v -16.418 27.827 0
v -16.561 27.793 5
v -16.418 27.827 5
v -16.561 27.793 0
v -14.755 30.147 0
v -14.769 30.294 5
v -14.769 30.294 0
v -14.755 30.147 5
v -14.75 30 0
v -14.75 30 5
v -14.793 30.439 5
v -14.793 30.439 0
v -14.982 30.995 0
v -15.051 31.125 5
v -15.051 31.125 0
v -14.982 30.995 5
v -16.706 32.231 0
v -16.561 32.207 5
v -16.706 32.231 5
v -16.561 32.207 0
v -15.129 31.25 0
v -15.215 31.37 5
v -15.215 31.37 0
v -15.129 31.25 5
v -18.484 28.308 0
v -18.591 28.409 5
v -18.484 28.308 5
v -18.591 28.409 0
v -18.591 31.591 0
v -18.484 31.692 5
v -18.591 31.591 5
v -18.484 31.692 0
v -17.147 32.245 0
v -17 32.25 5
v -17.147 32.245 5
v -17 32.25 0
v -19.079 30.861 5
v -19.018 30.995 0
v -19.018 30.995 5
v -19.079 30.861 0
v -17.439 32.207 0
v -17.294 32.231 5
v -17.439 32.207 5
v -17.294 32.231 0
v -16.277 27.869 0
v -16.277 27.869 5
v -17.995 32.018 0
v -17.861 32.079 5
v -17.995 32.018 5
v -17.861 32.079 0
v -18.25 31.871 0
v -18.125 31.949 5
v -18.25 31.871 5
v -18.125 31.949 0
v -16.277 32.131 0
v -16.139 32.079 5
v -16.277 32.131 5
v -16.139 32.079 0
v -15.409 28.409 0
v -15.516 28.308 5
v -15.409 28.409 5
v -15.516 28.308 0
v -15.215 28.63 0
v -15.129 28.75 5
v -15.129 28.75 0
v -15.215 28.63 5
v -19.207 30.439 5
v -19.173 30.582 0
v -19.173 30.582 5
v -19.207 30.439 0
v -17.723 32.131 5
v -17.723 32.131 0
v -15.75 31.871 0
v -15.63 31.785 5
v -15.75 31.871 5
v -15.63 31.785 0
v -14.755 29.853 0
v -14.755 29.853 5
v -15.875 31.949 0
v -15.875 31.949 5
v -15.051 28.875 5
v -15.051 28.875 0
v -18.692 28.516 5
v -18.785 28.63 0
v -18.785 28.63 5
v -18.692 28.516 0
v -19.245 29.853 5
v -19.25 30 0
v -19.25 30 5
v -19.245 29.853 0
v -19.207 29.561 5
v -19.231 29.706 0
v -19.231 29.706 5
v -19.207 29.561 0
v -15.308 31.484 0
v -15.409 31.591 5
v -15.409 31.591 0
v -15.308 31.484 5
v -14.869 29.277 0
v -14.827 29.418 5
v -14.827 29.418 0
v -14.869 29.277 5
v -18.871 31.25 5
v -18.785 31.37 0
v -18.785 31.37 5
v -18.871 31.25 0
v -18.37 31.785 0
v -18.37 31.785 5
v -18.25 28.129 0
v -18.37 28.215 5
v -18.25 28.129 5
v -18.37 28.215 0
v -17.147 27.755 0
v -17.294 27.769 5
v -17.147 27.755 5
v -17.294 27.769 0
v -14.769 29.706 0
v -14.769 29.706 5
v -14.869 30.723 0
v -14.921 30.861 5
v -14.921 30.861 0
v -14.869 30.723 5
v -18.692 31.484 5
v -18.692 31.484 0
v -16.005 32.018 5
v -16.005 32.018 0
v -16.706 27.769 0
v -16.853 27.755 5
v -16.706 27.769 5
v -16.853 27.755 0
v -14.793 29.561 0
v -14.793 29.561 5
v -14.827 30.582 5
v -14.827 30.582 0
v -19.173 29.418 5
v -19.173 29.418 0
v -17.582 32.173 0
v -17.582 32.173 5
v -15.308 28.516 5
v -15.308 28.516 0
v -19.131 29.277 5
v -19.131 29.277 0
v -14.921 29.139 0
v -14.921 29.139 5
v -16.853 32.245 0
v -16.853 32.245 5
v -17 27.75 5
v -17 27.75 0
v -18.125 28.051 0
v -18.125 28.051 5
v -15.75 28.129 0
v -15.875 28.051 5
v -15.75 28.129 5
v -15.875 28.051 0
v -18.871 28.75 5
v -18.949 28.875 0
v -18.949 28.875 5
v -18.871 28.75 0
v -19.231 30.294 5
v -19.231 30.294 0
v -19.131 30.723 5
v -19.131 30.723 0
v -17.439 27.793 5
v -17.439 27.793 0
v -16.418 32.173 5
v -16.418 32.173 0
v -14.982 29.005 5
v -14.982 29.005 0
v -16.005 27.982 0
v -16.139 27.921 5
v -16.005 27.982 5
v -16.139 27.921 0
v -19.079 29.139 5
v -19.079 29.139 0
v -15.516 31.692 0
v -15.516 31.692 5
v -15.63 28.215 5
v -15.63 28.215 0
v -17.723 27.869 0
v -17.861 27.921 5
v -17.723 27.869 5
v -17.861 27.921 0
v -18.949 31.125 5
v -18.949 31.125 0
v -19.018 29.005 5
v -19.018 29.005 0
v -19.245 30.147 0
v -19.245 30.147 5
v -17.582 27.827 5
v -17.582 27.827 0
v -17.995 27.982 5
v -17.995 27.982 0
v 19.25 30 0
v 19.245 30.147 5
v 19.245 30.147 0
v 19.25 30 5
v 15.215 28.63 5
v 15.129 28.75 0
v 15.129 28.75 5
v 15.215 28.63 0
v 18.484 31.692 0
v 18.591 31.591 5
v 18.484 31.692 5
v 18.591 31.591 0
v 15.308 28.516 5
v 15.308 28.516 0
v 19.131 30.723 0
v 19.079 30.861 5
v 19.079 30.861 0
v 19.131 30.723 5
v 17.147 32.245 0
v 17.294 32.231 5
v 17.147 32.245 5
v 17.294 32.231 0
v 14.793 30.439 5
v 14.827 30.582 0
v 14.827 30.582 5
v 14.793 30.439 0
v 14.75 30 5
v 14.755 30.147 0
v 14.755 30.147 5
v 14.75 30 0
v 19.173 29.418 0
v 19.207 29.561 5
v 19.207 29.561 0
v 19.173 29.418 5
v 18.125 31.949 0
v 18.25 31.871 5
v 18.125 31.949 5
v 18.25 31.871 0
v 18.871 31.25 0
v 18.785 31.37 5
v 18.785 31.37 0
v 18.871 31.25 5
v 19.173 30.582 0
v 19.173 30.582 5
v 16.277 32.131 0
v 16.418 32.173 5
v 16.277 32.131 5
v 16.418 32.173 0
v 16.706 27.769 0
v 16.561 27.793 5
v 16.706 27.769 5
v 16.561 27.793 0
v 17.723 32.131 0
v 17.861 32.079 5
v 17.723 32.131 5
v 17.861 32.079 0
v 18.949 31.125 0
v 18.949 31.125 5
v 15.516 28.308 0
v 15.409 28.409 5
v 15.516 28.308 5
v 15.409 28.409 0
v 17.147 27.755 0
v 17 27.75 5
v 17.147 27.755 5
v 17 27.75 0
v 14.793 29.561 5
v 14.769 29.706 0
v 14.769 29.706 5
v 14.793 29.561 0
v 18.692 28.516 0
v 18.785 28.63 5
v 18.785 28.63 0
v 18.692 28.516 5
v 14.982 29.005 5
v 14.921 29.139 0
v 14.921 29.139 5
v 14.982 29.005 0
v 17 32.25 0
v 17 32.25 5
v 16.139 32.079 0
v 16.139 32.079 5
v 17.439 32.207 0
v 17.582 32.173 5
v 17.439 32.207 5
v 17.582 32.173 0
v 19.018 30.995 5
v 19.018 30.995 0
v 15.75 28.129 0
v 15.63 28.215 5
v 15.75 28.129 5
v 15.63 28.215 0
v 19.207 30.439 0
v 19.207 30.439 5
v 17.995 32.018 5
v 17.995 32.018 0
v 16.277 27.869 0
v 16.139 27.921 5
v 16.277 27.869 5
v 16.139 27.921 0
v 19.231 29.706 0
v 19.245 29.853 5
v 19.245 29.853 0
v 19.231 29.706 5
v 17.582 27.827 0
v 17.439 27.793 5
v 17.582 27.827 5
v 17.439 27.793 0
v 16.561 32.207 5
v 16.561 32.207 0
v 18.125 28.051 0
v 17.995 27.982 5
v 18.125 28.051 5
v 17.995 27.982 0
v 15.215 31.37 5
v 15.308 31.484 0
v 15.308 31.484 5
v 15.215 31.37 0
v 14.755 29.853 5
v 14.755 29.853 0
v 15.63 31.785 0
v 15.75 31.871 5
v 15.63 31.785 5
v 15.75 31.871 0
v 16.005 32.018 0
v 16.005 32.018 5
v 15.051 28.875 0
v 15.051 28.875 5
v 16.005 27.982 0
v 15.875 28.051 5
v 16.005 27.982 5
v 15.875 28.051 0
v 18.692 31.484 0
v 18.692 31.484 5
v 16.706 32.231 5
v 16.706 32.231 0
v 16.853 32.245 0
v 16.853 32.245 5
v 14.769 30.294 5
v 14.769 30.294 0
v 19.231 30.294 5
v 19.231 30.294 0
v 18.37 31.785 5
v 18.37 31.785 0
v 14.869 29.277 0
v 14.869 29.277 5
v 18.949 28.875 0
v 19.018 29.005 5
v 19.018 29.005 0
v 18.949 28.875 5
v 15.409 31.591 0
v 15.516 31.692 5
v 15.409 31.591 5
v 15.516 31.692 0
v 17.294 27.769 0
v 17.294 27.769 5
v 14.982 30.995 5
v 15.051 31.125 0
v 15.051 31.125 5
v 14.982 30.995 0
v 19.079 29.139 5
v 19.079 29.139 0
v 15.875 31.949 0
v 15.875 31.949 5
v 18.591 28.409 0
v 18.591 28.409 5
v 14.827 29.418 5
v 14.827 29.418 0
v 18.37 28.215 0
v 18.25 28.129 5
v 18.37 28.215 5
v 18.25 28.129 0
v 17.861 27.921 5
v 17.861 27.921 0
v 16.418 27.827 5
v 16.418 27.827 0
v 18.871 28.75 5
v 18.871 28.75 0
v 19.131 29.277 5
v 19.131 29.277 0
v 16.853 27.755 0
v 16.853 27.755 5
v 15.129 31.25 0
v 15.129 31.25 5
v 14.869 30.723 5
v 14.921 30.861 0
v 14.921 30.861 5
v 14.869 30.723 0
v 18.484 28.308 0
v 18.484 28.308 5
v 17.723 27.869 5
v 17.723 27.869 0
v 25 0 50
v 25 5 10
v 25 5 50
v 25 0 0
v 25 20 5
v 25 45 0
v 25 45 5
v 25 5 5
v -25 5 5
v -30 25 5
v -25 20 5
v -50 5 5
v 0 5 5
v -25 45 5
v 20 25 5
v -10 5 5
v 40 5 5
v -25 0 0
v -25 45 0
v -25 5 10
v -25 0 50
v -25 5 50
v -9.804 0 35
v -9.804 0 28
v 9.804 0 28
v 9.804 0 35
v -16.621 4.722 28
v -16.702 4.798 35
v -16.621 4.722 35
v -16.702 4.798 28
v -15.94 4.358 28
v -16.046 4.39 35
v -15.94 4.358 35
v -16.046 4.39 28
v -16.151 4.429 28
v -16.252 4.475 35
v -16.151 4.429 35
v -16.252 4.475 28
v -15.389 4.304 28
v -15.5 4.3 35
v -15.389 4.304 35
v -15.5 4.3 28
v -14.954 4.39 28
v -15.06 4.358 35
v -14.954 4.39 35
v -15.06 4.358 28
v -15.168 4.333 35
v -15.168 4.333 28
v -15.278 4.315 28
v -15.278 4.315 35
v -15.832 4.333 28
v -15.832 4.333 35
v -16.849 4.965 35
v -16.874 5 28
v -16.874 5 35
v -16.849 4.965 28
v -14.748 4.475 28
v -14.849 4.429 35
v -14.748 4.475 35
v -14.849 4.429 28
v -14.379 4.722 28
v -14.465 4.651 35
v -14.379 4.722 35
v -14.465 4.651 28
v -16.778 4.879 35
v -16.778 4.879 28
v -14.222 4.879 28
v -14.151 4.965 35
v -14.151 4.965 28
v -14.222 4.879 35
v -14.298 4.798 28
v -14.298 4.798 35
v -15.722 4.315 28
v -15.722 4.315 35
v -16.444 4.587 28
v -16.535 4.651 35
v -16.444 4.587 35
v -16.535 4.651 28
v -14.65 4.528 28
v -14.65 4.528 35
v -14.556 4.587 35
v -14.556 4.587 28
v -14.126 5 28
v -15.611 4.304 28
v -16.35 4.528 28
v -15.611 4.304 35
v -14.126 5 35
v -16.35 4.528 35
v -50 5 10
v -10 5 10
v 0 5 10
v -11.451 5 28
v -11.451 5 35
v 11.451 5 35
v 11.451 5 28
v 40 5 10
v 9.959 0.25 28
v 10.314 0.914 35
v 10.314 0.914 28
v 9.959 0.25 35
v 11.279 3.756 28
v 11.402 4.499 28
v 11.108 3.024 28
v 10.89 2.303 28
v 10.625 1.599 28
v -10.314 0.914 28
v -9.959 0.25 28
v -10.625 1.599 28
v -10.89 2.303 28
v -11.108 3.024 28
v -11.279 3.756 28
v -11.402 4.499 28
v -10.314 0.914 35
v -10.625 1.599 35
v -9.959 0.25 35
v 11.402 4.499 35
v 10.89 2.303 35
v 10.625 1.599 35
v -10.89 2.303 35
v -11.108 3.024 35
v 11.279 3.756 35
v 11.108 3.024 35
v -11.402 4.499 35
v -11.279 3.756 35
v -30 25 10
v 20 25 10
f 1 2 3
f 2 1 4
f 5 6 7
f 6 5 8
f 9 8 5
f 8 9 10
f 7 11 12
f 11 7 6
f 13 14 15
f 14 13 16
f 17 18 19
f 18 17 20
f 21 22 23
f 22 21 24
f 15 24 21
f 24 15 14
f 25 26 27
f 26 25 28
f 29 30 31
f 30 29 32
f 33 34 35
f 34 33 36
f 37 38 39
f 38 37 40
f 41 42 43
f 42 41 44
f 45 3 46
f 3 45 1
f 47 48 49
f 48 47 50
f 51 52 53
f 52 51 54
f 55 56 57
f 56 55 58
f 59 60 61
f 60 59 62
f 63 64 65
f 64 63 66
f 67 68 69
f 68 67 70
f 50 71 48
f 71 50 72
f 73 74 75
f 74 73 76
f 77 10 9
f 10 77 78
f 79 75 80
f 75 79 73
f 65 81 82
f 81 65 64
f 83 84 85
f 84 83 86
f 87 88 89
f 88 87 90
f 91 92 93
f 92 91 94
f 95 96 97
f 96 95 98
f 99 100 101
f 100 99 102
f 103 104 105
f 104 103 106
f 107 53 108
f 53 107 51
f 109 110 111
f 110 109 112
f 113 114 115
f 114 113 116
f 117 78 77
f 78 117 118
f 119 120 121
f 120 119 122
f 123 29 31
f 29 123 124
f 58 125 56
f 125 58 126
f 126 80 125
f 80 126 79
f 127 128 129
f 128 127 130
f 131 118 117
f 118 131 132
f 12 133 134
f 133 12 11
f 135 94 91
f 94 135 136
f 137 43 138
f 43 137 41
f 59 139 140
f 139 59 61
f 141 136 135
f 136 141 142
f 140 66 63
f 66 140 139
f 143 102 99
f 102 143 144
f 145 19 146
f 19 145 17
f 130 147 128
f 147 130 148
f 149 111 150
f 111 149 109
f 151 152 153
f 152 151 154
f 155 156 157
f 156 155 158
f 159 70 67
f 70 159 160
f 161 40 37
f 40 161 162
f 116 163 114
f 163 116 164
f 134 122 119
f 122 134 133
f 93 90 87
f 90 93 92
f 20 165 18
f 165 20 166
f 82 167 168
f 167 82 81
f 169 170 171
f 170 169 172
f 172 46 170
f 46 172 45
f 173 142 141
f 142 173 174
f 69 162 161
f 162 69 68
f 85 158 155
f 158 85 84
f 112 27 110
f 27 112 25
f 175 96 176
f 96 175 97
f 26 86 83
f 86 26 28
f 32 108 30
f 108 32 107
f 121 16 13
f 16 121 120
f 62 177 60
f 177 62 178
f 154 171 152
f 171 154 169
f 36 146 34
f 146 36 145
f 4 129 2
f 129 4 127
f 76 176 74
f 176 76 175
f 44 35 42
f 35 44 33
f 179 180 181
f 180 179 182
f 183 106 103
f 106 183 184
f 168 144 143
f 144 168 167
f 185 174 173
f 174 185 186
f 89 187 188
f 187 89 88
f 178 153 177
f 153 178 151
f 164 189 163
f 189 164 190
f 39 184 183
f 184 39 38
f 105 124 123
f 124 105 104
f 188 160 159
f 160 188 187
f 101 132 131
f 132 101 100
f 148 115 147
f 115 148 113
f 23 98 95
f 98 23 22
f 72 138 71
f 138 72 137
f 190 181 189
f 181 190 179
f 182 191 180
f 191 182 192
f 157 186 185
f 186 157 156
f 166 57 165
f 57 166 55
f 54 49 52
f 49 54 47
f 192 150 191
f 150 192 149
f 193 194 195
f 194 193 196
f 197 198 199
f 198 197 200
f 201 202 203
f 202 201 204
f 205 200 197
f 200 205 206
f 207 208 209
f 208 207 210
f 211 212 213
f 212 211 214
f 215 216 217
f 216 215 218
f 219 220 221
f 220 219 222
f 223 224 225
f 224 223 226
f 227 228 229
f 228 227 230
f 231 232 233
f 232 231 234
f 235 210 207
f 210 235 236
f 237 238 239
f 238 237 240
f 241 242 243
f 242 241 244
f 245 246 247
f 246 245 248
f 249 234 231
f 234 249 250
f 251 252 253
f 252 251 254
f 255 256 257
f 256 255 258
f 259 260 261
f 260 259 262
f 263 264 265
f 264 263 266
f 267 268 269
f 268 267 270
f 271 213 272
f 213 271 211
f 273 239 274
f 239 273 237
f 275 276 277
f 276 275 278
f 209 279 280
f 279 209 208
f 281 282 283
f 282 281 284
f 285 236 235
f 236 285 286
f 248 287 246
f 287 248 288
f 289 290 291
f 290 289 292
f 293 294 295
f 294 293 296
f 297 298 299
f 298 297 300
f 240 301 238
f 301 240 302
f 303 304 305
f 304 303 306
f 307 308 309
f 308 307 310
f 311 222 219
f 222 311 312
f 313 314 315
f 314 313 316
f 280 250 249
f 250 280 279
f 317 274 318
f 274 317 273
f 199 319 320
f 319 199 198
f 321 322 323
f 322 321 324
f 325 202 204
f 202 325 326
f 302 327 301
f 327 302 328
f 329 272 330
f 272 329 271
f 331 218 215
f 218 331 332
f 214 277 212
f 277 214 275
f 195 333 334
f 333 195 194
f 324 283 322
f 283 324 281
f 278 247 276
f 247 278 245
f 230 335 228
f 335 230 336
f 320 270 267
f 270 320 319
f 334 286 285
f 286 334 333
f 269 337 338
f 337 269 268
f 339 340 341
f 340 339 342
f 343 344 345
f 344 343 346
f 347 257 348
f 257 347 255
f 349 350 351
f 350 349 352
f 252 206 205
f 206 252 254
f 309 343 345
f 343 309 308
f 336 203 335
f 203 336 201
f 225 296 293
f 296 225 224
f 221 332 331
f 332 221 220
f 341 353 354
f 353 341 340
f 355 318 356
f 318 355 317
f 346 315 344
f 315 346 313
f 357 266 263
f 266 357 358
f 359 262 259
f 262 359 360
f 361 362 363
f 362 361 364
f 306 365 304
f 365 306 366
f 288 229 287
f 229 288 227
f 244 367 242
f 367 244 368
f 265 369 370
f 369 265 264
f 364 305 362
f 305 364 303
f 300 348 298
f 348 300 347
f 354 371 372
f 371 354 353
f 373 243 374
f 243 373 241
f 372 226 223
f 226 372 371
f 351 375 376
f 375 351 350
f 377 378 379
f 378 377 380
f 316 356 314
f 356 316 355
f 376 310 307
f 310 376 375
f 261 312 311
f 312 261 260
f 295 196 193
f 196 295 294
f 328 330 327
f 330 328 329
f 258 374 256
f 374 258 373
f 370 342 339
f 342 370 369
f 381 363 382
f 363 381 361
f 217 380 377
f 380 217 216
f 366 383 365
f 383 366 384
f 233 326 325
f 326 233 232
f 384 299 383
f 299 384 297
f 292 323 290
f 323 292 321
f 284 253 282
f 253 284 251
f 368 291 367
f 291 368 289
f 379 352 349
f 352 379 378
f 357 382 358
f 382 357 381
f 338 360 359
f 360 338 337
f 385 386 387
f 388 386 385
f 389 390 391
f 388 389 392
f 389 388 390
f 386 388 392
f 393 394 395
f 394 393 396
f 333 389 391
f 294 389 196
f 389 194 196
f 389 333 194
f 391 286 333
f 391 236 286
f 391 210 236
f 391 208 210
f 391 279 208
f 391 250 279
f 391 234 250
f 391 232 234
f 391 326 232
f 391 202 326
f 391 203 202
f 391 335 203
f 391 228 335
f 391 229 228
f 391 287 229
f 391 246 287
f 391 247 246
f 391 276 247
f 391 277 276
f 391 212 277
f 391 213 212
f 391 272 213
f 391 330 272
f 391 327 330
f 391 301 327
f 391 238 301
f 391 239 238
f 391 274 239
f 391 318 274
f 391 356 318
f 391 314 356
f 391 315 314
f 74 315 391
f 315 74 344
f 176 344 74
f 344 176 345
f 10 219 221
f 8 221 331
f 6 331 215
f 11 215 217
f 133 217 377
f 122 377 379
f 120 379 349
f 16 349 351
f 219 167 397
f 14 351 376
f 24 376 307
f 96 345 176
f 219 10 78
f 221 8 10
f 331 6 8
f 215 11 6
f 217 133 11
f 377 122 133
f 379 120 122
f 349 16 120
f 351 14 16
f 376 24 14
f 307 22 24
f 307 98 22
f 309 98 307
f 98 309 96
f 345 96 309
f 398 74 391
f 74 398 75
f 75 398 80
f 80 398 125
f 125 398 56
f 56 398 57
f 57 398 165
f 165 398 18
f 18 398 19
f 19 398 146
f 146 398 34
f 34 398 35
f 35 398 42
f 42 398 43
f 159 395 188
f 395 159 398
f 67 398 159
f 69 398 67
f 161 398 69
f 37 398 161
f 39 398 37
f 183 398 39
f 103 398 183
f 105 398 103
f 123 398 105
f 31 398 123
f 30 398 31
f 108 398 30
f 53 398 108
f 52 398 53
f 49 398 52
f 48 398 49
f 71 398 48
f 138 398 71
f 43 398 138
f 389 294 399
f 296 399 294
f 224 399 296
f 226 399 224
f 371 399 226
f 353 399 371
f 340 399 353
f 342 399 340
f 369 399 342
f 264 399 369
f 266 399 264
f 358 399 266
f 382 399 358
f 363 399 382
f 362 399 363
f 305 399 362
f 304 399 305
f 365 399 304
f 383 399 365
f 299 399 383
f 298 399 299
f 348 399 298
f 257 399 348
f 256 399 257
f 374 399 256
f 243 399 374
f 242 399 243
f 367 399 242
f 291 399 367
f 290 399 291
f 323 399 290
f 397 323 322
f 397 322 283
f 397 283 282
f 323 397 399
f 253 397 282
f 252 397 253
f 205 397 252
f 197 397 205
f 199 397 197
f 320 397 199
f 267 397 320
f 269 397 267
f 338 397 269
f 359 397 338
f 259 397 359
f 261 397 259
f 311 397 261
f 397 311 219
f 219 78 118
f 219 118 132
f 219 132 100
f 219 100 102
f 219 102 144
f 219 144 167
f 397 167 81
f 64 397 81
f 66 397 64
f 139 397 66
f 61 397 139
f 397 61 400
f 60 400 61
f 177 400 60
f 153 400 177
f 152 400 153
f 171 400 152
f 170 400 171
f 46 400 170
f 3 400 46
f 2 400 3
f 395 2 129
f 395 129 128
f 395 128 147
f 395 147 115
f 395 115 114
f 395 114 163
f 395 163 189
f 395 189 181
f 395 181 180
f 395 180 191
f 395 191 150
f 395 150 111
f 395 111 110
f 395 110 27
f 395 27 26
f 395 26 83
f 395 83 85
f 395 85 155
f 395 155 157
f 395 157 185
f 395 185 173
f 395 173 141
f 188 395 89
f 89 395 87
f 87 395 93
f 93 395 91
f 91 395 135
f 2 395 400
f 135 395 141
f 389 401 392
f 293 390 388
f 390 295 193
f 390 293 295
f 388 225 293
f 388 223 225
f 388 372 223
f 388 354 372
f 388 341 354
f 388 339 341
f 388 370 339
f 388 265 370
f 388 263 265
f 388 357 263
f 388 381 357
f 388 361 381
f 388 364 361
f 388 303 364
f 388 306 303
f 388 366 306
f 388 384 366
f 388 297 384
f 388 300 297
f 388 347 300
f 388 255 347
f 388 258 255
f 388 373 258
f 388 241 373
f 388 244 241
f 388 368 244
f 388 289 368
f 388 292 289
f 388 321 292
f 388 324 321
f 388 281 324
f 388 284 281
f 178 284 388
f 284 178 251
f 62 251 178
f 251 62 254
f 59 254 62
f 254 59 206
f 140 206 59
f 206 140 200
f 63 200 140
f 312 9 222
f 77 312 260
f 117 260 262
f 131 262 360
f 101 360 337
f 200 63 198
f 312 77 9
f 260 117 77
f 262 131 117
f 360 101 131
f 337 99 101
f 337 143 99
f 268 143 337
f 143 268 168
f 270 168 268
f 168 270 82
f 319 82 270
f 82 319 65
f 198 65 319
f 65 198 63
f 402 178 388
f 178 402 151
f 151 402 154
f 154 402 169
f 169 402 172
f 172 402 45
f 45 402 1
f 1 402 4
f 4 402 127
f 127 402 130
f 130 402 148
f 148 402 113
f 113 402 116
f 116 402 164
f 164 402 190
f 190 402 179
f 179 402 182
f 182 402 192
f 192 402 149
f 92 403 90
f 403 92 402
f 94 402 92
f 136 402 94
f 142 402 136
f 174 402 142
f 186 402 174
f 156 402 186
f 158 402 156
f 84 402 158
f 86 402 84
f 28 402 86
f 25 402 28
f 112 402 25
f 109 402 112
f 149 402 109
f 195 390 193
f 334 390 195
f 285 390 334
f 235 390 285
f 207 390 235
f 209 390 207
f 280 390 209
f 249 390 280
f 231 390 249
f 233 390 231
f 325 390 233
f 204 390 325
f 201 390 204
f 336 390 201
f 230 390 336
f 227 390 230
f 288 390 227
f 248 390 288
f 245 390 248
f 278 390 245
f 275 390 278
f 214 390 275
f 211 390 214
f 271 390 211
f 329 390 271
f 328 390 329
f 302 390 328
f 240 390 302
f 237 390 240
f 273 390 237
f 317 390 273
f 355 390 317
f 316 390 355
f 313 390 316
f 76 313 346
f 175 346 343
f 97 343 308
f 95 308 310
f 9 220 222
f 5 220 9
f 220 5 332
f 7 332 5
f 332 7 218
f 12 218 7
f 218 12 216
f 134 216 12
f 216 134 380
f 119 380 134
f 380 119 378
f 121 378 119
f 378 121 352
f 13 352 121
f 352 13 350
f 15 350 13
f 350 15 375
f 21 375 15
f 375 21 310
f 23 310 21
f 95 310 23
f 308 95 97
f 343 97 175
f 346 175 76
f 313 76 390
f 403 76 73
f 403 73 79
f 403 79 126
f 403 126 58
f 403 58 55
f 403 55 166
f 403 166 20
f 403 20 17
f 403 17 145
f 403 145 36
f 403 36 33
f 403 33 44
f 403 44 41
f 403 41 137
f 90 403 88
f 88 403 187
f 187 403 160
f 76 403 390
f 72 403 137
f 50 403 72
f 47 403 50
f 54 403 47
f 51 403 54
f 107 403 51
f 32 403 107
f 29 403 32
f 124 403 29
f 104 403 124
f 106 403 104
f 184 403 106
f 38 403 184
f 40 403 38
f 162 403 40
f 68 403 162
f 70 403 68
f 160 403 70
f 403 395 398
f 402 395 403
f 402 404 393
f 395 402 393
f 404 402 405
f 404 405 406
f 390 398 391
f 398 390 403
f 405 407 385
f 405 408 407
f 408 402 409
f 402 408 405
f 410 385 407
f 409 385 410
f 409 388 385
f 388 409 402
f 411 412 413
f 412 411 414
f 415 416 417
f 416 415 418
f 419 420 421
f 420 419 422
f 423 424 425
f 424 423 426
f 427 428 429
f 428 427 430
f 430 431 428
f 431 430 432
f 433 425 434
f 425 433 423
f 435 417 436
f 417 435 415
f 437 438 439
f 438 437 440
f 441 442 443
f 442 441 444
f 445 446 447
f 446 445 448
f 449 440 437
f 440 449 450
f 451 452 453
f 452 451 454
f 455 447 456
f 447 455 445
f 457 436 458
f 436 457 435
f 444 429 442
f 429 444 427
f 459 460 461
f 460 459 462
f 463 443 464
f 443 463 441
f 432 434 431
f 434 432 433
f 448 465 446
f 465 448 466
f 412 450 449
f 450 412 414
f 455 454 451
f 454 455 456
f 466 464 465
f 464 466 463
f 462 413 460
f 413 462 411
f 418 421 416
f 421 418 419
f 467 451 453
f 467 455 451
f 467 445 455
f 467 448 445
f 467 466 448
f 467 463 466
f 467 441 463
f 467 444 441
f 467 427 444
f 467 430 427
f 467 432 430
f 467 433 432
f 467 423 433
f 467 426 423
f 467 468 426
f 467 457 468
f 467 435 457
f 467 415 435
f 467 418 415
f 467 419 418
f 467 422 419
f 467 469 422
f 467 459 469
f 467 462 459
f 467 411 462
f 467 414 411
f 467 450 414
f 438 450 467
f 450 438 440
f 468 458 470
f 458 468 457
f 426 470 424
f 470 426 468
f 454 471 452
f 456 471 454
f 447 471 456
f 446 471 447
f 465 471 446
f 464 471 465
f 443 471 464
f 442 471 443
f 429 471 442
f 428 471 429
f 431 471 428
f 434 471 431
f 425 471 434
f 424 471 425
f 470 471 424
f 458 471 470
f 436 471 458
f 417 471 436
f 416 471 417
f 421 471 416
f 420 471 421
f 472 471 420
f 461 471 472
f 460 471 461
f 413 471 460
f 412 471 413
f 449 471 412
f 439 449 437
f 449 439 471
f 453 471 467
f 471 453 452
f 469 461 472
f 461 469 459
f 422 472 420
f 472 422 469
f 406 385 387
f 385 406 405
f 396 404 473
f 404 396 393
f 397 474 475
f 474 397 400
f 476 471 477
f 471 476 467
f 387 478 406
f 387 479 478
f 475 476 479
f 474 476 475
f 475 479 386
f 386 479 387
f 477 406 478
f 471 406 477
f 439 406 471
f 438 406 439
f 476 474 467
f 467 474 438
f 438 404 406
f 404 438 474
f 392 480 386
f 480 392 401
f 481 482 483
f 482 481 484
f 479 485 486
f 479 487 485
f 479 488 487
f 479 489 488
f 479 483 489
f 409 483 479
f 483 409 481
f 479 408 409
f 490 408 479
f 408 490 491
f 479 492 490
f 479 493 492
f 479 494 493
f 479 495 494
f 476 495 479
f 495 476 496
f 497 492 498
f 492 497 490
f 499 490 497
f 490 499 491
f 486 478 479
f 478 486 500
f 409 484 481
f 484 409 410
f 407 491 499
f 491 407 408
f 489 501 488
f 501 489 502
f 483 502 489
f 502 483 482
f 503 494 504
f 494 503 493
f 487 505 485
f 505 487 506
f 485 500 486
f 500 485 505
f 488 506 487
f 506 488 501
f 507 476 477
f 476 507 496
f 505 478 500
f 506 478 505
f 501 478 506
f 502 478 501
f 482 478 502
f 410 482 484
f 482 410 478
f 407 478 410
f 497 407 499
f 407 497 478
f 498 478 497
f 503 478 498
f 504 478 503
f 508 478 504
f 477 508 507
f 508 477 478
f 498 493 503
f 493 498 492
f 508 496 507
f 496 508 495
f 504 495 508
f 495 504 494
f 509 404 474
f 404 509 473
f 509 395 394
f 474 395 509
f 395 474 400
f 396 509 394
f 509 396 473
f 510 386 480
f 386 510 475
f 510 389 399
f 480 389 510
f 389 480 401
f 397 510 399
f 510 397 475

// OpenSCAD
// L-shaped mounting bracket for NEMA 17 stepper motor (syringe pump)
// Print orientation: base plate on bed, motor plate builds upward (+Z)

// ---------------- Parameters ----------------
plate_t      = 5;     // base plate thickness (Z)
base_x0      = -25;   // base plate left edge (X)
base_x1      = 25;    // base plate right edge (X)
base_y0      = 0;     // base plate front edge (Y)
base_y1      = 45;    // base plate back edge (Y)

motor_h      = 50;    // motor plate height (Z)
motor_x0     = -25;   // motor plate left edge (X)
motor_x1     = 25;    // motor plate right edge (X)
motor_y0     = 0;     // motor plate front edge (Y)
motor_y1     = 5;     // motor plate back edge (Y)

boss_d       = 23;    // motor centring boss hole diameter
boss_x       = 0;     // boss hole centre X
boss_z       = 28;    // boss hole centre Z
boss_pitch   = 31;    // M3 screw pattern side length
screw_d      = 3.4;   // M3 screw hole diameter

gusset_t     = 5;     // gusset thickness (X)
gusset_y     = 20;    // gusset leg along +Y
gusset_z     = 20;    // gusset leg along +Z
gusset_x0    = -25;   // left gusset start X
gusset_x1    = 25;    // right gusset end X

eps          = 0.5;   // cutter overshoot past faces

$fn = 96;

// ---------------- Model ----------------
union() {
    // Base plate with M4 through-holes
    difference() {
        translate([base_x0, base_y0, 0])
            cube([base_x1 - base_x0, base_y1 - base_y0, plate_t]);
        for (sx = [-17, 17])
            translate([sx, base_y1 - 15, -eps])
                cylinder(d = 4.5, h = plate_t + 2 * eps);
    }

    // Motor plate standing on back edge of base, with boss hole and M3 screws
    difference() {
        translate([motor_x0, motor_y0, 0])
            cube([motor_x1 - motor_x0, motor_y1 - motor_y0, motor_h]);
        translate([boss_x, motor_y1 + 1, boss_z])
            cylinder(d = boss_d, h = motor_y1 - motor_y0 + 2);
        for (a = [0, 90, 180, 270])
            rotate([0, 0, a])
                translate([boss_x - boss_pitch / 2, motor_y1 + 1, boss_z])
                    cylinder(d = screw_d, h = motor_y1 - motor_y0 + 2);
    }

    // Triangular gussets flush with left and right edges
    for (x = [gusset_x0, gusset_x1]) {
        translate([x - gusset_t, 5, 5])
            linear_extrude(gusset_t)
                polygon([[-gusset_y, 0], [gusset_y, 0], [0, gusset_z]]);
    }
}
